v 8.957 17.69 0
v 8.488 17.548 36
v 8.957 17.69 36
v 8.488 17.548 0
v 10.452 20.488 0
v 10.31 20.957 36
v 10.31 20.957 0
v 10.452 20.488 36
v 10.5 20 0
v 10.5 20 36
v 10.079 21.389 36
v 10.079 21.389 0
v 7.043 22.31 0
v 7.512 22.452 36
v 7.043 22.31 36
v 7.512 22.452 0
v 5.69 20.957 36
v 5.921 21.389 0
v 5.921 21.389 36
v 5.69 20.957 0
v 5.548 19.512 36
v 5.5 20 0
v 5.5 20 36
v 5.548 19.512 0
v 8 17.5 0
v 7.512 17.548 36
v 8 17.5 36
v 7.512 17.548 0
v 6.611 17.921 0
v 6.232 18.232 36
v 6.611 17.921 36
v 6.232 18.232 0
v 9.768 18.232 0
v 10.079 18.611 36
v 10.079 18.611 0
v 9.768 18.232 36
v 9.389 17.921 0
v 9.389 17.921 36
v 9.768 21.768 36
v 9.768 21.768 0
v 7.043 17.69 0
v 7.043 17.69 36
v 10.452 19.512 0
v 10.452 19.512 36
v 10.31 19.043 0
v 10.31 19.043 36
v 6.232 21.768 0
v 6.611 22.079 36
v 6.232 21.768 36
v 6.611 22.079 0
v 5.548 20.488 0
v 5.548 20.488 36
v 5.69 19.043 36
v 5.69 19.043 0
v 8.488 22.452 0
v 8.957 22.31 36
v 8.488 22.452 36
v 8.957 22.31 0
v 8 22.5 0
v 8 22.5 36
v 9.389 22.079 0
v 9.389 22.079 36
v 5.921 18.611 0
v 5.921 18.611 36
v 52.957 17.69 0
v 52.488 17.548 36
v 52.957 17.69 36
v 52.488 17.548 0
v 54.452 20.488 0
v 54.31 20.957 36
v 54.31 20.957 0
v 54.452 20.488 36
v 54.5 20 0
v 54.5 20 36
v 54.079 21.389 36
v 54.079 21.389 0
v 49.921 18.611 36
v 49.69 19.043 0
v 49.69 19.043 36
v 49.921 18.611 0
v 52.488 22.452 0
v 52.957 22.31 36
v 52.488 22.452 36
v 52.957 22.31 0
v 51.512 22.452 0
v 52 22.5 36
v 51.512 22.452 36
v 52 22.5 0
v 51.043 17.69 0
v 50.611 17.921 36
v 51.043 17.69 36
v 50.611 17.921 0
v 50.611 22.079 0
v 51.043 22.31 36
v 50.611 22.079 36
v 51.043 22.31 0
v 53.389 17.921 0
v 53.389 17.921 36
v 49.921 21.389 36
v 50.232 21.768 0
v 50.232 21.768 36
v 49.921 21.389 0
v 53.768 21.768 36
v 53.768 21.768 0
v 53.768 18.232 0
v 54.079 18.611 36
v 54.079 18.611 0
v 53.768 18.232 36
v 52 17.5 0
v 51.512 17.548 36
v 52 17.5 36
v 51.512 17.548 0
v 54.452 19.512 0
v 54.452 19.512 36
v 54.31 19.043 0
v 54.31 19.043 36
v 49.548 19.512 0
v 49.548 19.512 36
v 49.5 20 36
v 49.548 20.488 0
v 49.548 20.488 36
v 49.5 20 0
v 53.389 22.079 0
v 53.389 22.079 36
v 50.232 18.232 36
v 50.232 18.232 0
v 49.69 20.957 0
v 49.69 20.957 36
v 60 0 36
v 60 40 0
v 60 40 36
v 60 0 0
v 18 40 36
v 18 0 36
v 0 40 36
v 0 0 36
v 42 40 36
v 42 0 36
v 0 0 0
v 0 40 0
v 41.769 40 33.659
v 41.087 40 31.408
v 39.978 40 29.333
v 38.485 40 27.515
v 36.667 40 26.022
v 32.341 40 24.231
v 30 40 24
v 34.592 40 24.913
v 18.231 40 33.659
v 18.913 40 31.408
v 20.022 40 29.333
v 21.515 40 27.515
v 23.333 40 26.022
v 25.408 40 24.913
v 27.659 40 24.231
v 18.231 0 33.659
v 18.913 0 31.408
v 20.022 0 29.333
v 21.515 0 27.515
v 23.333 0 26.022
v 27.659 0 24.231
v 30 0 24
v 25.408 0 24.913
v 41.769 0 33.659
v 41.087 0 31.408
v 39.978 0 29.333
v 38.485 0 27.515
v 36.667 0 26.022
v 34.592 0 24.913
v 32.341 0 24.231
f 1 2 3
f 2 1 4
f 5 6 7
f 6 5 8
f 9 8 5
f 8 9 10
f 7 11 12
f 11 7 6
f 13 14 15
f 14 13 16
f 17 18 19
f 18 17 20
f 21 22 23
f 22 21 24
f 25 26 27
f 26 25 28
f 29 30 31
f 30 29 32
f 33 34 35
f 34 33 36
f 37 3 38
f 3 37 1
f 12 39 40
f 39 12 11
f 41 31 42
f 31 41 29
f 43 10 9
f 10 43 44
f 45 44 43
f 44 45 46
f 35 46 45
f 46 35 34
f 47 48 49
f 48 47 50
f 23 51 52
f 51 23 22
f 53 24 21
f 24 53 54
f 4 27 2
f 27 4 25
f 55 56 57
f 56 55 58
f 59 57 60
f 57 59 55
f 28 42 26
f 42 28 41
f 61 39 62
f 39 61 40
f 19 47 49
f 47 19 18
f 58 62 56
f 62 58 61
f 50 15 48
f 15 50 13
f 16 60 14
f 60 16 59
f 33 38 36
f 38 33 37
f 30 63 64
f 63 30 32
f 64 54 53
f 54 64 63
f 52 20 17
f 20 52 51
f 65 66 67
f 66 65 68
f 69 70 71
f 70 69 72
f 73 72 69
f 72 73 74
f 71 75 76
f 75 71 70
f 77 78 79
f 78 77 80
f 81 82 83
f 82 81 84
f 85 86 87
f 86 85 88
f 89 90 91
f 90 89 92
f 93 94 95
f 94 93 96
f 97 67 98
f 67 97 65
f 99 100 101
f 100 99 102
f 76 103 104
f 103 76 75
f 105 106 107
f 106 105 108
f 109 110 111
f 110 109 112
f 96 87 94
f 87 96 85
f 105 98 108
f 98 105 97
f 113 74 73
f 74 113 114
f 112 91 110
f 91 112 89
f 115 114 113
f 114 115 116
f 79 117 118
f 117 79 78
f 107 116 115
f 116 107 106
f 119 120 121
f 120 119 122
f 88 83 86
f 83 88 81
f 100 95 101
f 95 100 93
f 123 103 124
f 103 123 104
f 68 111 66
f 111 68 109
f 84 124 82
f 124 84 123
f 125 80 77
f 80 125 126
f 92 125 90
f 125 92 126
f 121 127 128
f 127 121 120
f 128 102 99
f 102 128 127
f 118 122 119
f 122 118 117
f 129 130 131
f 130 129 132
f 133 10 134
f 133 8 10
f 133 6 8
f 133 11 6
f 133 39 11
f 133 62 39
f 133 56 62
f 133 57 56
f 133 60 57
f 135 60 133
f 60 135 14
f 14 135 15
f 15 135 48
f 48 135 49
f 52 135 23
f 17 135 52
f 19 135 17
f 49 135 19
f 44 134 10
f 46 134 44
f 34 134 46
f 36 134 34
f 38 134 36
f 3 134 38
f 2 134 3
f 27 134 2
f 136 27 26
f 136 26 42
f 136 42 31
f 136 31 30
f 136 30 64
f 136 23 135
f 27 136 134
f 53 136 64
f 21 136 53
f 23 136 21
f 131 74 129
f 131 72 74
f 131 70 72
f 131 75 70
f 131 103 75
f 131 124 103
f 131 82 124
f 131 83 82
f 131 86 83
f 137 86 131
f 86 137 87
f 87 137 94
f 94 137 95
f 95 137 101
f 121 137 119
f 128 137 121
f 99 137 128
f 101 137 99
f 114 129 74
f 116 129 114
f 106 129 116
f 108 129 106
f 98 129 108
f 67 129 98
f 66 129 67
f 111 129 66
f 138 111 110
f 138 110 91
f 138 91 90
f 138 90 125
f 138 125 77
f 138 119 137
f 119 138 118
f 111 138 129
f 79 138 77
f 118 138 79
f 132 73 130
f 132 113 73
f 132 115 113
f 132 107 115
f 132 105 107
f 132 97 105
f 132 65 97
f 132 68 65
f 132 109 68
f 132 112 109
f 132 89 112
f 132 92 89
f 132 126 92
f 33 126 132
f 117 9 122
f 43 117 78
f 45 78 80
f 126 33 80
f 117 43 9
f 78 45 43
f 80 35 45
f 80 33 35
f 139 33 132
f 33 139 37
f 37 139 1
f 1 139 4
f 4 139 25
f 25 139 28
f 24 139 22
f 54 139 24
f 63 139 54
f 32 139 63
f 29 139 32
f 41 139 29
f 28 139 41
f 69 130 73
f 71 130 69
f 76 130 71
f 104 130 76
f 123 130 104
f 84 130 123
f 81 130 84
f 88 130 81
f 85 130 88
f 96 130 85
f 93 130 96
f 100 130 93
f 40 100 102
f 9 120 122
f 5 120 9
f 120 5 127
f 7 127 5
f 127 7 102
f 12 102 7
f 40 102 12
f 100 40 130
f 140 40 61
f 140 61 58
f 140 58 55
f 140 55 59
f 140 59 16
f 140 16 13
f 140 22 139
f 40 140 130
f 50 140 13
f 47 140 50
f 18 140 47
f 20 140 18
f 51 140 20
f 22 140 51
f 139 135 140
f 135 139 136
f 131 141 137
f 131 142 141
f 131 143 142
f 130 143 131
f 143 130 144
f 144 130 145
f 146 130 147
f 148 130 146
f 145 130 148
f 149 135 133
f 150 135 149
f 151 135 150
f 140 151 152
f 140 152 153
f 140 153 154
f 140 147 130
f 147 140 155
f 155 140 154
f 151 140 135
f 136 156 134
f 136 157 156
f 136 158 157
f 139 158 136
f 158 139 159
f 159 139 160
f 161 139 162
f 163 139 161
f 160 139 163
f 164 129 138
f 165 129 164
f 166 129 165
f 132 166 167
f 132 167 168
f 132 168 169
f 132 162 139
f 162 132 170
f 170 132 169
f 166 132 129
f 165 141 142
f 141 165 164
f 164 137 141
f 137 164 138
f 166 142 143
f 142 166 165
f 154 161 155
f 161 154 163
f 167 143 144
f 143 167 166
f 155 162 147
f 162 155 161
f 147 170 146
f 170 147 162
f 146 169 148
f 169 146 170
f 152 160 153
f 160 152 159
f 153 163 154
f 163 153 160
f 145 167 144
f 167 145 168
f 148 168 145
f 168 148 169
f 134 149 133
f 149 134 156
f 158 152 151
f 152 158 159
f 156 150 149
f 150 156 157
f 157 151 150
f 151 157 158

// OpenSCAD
$fn = 32;

// ----------------------------------------------------------------------
// Saddle clamp: plain shaft clamp
// ----------------------------------------------------------------------

// --- parameters (mm) ---
blk_l = 60;               // block length, X
blk_w = 40;               // block width, Y
blk_h = 36;               // block height
clamp_r = 12;             // shaft groove radius
hole_r = 2.5;             // bolt hole radius
hole_m = 8;               // bolt hole margin from the ends

saw_depth = clamp_r + 3;  // saw kerf depth

difference() {
  cube([blk_l, blk_w, blk_h]);
  translate([blk_l / 2, -1, blk_h])
    rotate([-90, 0, 0])
      cylinder(h = blk_w + 2, r = clamp_r);
  for (sx = [0, 1])
    translate([sx ? blk_l - hole_m : hole_m, blk_w / 2, -1])
      cylinder(r = hole_r, h = blk_h + 2);
}
